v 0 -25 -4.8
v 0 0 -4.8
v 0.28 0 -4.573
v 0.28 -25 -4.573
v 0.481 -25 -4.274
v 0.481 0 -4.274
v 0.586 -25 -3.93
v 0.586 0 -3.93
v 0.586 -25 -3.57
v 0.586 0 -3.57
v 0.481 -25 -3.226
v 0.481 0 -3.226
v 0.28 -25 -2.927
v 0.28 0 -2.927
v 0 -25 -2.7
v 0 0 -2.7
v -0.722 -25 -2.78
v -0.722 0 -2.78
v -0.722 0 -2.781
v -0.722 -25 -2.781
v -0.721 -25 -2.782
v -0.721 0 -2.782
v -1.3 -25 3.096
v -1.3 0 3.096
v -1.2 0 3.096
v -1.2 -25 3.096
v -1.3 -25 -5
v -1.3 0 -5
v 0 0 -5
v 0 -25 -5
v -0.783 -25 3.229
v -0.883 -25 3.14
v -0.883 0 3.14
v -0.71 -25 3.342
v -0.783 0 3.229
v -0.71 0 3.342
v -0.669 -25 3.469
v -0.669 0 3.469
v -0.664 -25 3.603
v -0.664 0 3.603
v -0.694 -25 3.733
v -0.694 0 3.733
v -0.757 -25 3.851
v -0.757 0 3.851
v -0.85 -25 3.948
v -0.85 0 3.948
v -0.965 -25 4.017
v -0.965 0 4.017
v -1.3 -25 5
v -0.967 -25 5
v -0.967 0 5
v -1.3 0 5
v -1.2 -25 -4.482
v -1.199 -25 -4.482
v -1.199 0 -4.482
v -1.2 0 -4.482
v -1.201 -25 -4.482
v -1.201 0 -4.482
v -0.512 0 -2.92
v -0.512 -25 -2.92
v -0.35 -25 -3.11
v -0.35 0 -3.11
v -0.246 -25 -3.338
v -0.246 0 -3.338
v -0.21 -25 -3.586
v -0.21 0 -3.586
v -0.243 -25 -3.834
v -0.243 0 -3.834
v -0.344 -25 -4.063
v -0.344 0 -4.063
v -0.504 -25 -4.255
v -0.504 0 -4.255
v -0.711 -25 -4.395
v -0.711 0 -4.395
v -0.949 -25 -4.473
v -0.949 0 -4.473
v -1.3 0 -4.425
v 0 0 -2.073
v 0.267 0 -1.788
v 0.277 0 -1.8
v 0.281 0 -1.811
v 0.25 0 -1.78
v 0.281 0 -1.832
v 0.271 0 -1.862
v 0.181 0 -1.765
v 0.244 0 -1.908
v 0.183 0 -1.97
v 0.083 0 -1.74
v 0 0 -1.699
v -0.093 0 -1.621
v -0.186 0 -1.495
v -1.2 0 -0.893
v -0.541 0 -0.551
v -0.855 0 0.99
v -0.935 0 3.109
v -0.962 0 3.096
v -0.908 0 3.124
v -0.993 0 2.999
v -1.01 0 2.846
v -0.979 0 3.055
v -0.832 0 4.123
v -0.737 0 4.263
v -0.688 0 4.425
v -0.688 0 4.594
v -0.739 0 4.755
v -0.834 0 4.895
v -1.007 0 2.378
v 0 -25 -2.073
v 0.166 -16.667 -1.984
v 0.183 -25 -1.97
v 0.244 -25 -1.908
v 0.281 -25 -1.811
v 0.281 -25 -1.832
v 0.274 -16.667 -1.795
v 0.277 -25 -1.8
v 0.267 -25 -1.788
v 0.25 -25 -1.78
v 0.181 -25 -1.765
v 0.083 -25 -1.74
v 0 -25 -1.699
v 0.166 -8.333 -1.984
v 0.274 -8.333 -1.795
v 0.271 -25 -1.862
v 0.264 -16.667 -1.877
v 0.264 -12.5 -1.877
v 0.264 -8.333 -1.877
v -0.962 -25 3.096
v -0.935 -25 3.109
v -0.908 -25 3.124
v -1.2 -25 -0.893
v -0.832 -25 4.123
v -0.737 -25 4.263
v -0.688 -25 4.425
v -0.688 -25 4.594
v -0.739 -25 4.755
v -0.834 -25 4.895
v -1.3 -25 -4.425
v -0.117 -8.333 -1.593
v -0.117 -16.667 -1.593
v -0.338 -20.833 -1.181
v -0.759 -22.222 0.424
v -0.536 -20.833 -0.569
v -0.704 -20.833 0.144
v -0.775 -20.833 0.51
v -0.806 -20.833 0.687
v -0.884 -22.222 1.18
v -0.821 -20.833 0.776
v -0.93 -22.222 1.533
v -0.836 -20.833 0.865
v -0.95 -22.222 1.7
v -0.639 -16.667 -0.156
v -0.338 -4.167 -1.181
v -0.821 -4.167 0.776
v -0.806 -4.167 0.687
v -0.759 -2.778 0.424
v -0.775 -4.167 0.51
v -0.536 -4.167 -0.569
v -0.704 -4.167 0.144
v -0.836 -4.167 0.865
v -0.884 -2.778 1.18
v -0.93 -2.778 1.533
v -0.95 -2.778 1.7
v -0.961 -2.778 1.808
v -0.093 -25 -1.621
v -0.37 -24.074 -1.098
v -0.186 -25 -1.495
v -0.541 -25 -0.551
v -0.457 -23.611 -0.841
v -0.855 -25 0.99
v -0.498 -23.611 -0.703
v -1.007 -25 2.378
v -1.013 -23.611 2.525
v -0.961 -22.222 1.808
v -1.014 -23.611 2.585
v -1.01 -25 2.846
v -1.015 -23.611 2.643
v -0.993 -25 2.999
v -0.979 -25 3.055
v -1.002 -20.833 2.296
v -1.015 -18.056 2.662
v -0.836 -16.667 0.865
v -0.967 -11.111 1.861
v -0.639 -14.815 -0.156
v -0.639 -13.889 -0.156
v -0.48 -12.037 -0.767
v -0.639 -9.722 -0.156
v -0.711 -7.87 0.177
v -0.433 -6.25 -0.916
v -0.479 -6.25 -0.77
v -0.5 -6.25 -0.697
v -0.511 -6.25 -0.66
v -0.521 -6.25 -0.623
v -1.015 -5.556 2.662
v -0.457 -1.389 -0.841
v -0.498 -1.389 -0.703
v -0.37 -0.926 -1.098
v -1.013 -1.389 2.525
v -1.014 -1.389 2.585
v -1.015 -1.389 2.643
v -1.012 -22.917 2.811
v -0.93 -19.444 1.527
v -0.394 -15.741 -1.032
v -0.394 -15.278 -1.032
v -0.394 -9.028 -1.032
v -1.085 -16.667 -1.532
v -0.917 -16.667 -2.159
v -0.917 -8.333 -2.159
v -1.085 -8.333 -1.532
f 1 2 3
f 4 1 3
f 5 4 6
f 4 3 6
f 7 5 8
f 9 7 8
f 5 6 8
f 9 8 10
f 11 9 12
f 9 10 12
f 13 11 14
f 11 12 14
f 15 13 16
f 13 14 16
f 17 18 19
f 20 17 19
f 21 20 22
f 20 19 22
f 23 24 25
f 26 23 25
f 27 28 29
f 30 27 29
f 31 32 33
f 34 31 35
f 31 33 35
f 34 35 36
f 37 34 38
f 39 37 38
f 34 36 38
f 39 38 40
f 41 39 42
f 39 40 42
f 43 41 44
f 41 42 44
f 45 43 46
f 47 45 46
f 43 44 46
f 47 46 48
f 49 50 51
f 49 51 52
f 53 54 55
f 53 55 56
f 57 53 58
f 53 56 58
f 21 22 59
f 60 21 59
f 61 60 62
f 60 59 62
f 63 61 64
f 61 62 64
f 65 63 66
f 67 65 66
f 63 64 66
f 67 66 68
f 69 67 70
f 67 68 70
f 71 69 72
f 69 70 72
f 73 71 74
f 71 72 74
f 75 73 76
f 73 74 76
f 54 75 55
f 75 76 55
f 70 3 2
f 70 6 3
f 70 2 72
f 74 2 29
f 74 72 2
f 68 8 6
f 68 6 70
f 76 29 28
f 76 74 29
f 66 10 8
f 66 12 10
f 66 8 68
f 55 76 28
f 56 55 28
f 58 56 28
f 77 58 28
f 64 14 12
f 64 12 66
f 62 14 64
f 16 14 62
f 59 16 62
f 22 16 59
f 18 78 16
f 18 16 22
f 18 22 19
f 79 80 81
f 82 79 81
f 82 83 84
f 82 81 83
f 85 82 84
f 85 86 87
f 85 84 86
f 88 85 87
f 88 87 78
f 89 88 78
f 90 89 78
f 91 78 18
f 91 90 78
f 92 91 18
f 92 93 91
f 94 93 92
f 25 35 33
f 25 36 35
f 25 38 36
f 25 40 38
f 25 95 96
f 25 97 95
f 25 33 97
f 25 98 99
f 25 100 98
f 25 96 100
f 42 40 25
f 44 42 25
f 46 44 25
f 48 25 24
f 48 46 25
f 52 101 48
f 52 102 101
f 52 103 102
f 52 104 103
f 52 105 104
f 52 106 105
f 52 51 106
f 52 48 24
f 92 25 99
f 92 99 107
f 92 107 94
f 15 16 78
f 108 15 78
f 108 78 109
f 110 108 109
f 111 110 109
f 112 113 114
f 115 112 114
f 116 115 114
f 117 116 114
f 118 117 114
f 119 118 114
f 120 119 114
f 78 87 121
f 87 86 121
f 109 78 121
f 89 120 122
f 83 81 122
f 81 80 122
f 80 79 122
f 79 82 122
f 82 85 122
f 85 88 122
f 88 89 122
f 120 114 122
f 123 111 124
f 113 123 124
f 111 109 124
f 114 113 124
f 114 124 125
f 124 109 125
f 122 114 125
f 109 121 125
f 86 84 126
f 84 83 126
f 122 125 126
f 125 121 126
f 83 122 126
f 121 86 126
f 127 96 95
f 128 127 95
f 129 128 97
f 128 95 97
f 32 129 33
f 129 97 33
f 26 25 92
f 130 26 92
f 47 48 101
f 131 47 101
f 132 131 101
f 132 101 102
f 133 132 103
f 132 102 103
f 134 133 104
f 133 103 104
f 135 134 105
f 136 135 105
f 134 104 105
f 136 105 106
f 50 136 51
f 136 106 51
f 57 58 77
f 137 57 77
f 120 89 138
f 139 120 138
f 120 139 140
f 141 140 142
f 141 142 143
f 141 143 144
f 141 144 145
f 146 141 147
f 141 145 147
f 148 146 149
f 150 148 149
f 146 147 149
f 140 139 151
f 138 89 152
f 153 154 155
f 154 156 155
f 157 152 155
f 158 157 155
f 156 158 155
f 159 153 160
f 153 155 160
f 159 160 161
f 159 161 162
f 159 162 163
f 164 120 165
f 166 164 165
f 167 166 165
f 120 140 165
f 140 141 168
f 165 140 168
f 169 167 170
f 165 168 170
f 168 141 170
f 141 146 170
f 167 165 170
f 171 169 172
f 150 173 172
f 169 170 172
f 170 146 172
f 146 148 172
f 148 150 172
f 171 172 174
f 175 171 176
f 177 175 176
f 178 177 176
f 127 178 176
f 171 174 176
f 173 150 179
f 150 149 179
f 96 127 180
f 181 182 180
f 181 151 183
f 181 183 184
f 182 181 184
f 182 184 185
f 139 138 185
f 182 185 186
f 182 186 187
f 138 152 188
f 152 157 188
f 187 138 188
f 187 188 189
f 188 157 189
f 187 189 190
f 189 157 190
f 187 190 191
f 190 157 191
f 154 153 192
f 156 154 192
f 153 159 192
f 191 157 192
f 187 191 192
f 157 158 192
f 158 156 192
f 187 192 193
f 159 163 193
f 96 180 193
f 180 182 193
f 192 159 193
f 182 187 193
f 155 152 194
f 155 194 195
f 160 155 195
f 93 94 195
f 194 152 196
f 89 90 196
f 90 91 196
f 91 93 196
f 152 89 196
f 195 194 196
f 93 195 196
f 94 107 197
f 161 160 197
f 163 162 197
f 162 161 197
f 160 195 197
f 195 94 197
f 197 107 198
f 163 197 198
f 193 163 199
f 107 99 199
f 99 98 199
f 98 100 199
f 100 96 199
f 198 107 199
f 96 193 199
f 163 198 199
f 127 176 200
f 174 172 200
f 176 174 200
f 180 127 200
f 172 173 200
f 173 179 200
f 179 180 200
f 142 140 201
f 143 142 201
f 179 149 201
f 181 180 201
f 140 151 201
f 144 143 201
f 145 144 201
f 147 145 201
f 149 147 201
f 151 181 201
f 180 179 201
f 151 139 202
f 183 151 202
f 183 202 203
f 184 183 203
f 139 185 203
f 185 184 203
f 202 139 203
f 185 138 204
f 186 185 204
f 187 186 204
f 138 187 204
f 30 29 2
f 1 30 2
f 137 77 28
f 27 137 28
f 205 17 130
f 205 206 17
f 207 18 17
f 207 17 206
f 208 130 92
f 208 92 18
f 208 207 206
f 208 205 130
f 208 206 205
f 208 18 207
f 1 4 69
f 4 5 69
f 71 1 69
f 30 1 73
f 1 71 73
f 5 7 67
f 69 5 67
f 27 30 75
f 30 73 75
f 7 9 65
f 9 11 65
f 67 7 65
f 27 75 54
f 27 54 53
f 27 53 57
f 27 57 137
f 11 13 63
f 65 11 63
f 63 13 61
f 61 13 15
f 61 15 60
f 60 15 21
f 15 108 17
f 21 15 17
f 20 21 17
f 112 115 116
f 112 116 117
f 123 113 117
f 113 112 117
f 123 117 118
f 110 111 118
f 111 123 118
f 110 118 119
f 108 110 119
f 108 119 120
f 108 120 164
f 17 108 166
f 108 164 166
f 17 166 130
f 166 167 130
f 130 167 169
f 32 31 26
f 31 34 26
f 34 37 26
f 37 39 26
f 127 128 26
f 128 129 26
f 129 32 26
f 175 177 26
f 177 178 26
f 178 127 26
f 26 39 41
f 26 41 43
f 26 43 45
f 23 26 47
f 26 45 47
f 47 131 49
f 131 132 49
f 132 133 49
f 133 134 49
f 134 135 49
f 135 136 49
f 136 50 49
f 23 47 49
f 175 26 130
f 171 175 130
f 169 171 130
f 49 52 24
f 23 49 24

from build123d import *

# Parameters (mm, degrees)
F1_DEPTH = 25


with BuildPart() as f1:
    # F0 (on Front) → F1 (new body)
    with BuildSketch(Plane.XZ):
        with BuildLine():
            add(Edge.make_bspline(
                [(0, -2.5), (-0.0708144549, -2.4524918378), (-0.1956100643, -2.3687686762), (-0.3180885676, -2.1971845687), (-0.1116996866, -2.1227784123), (0, -2.0733320448)],
                knots=[0, 0, 0, 0, 0.0945574941, 0.1666377313, 0.2518567558, 0.2518567558, 0.2518567558, 0.2518567558], degree=3))
            Line((0, -2.5), (0, -2.0733320448))
        make_face()
        with BuildLine():
            Line((0, -2.7), (0, -2.5))
            add(Edge.make_bspline(
                [(0, -2.5), (-0.0708144549, -2.4524918378), (-0.1956100643, -2.3687686762), (-0.3180885676, -2.1971845687), (-0.1116996866, -2.1227784123), (0, -2.0733320448)],
                knots=[0, 0, 0, 0, 0.0945574941, 0.1666377313, 0.2518567558, 0.2518567558, 0.2518567558, 0.2518567558], degree=3))
            Line((0, -2.0733320448), (0, -1.6986069948))
            add(Edge.make_bspline(
                [(0, -1.6986069948), (-0.0383555824, -1.6741333918), (-0.6515753448, -1.1515664964), (-1.1755755053, 2.6788852088), (-0.9639657726, 3.0935284682), (-0.9623506631, 3.0964508274)],
                knots=[0.482349916, 0.482349916, 0.482349916, 0.482349916, 0.5109278826, 0.9233932624, 0.9264915283, 0.9264915283, 0.9264915283, 0.9264915283], degree=3))
            add(Edge.make_bspline(
                [(-0.9623506631, 3.0964508274), (-0.9410767081, 3.1349436593), (-0.9133074942, 3.1441076976), (-0.8826490073, 3.1402254678)],
                knots=[0.9264915283, 0.9264915283, 0.9264915283, 0.9264915283, 0.9673013749, 0.9673013749, 0.9673013749, 0.9673013749], degree=3))
            ThreePointArc((-0.8826490073, 3.1402254678), (-0.6635180881, 3.6029526705), (-0.9646388468, 4.0170313014))
            ThreePointArc((-0.9646388468, 4.0170313014), (-0.6816397602, 4.5092221063), (-0.9670821019, 5))
            Line((-0.9670821019, 5), (-1.3, 5))
            Line((-1.3, 5), (-1.3, 3.0956115703))
            Line((-1.3, 3.0956115703), (-1.2, 3.0958601291))
            Line((-1.2, 3.0958601291), (-1.2, 1.1517136591))
            Line((-1.2, 1.1517136591), (-1.2, -0.8931580232))
            add(Edge.make_bspline(
                [(-0.7223970163, -2.7801062833), (-0.921047879, -2.1601191709), (-1.119437918, -1.5398665045), (-1.2, -0.8931580232)],
                knots=[0.0003276246, 0.0003276246, 0.0003276246, 0.0003276246, 0.4939175623, 0.4939175623, 0.4939175623, 0.4939175623], degree=3))
            ThreePointArc((-0.7223970163, -2.7801062833), (-0.7217999511, -2.781163117), (-0.7208323102, -2.7818959578))
            ThreePointArc((-0.7208323102, -2.7818959578), (-0.2432721108, -3.8337162096), (-1.1993774544, -4.4819847944))
            ThreePointArc((-1.1993774544, -4.4819847944), (-1.199979754, -4.481857829), (-1.2005433473, -4.4816103465))
            Line((-1.2005433473, -4.4816103465), (-1.3, -4.4250912033))
            Line((-1.3, -4.4250912033), (-1.3, -5))
            Line((-1.3, -5), (0, -5))
            Line((0, -5), (0, -4.8))
            ThreePointArc((0, -4.8), (0.5995079207, -3.75), (0, -2.7))
        make_face()
        with BuildLine():
            Line((0, -1.6986069948), (0, -2.0733320448))
            add(Edge.make_bspline(
                [(0, -2.0733320448), (0.0594769695, -2.0470032325), (0.2344591808, -1.9618765045), (0.3482438258, -1.7339244568), (0.1300816825, -1.7816084057), (0, -1.6986069948)],
                knots=[0.2518567558, 0.2518567558, 0.2518567558, 0.2518567558, 0.2972335109, 0.3854286924, 0.482349916, 0.482349916, 0.482349916, 0.482349916], degree=3))
        make_face()
        with BuildLine():
            add(Edge.make_bspline(
                [(-0.9623506631, 3.0964508274), (-0.9410767081, 3.1349436593), (-0.9133074942, 3.1441076976), (-0.8826490073, 3.1402254678)],
                knots=[0.9264915283, 0.9264915283, 0.9264915283, 0.9264915283, 0.9673013749, 0.9673013749, 0.9673013749, 0.9673013749], degree=3))
            ThreePointArc((-0.9623506631, 3.0964508274), (-0.9215059833, 3.1165286149), (-0.8826490073, 3.1402254678))
        make_face()
    extrude(amount=F1_DEPTH)


solid = f1.part
